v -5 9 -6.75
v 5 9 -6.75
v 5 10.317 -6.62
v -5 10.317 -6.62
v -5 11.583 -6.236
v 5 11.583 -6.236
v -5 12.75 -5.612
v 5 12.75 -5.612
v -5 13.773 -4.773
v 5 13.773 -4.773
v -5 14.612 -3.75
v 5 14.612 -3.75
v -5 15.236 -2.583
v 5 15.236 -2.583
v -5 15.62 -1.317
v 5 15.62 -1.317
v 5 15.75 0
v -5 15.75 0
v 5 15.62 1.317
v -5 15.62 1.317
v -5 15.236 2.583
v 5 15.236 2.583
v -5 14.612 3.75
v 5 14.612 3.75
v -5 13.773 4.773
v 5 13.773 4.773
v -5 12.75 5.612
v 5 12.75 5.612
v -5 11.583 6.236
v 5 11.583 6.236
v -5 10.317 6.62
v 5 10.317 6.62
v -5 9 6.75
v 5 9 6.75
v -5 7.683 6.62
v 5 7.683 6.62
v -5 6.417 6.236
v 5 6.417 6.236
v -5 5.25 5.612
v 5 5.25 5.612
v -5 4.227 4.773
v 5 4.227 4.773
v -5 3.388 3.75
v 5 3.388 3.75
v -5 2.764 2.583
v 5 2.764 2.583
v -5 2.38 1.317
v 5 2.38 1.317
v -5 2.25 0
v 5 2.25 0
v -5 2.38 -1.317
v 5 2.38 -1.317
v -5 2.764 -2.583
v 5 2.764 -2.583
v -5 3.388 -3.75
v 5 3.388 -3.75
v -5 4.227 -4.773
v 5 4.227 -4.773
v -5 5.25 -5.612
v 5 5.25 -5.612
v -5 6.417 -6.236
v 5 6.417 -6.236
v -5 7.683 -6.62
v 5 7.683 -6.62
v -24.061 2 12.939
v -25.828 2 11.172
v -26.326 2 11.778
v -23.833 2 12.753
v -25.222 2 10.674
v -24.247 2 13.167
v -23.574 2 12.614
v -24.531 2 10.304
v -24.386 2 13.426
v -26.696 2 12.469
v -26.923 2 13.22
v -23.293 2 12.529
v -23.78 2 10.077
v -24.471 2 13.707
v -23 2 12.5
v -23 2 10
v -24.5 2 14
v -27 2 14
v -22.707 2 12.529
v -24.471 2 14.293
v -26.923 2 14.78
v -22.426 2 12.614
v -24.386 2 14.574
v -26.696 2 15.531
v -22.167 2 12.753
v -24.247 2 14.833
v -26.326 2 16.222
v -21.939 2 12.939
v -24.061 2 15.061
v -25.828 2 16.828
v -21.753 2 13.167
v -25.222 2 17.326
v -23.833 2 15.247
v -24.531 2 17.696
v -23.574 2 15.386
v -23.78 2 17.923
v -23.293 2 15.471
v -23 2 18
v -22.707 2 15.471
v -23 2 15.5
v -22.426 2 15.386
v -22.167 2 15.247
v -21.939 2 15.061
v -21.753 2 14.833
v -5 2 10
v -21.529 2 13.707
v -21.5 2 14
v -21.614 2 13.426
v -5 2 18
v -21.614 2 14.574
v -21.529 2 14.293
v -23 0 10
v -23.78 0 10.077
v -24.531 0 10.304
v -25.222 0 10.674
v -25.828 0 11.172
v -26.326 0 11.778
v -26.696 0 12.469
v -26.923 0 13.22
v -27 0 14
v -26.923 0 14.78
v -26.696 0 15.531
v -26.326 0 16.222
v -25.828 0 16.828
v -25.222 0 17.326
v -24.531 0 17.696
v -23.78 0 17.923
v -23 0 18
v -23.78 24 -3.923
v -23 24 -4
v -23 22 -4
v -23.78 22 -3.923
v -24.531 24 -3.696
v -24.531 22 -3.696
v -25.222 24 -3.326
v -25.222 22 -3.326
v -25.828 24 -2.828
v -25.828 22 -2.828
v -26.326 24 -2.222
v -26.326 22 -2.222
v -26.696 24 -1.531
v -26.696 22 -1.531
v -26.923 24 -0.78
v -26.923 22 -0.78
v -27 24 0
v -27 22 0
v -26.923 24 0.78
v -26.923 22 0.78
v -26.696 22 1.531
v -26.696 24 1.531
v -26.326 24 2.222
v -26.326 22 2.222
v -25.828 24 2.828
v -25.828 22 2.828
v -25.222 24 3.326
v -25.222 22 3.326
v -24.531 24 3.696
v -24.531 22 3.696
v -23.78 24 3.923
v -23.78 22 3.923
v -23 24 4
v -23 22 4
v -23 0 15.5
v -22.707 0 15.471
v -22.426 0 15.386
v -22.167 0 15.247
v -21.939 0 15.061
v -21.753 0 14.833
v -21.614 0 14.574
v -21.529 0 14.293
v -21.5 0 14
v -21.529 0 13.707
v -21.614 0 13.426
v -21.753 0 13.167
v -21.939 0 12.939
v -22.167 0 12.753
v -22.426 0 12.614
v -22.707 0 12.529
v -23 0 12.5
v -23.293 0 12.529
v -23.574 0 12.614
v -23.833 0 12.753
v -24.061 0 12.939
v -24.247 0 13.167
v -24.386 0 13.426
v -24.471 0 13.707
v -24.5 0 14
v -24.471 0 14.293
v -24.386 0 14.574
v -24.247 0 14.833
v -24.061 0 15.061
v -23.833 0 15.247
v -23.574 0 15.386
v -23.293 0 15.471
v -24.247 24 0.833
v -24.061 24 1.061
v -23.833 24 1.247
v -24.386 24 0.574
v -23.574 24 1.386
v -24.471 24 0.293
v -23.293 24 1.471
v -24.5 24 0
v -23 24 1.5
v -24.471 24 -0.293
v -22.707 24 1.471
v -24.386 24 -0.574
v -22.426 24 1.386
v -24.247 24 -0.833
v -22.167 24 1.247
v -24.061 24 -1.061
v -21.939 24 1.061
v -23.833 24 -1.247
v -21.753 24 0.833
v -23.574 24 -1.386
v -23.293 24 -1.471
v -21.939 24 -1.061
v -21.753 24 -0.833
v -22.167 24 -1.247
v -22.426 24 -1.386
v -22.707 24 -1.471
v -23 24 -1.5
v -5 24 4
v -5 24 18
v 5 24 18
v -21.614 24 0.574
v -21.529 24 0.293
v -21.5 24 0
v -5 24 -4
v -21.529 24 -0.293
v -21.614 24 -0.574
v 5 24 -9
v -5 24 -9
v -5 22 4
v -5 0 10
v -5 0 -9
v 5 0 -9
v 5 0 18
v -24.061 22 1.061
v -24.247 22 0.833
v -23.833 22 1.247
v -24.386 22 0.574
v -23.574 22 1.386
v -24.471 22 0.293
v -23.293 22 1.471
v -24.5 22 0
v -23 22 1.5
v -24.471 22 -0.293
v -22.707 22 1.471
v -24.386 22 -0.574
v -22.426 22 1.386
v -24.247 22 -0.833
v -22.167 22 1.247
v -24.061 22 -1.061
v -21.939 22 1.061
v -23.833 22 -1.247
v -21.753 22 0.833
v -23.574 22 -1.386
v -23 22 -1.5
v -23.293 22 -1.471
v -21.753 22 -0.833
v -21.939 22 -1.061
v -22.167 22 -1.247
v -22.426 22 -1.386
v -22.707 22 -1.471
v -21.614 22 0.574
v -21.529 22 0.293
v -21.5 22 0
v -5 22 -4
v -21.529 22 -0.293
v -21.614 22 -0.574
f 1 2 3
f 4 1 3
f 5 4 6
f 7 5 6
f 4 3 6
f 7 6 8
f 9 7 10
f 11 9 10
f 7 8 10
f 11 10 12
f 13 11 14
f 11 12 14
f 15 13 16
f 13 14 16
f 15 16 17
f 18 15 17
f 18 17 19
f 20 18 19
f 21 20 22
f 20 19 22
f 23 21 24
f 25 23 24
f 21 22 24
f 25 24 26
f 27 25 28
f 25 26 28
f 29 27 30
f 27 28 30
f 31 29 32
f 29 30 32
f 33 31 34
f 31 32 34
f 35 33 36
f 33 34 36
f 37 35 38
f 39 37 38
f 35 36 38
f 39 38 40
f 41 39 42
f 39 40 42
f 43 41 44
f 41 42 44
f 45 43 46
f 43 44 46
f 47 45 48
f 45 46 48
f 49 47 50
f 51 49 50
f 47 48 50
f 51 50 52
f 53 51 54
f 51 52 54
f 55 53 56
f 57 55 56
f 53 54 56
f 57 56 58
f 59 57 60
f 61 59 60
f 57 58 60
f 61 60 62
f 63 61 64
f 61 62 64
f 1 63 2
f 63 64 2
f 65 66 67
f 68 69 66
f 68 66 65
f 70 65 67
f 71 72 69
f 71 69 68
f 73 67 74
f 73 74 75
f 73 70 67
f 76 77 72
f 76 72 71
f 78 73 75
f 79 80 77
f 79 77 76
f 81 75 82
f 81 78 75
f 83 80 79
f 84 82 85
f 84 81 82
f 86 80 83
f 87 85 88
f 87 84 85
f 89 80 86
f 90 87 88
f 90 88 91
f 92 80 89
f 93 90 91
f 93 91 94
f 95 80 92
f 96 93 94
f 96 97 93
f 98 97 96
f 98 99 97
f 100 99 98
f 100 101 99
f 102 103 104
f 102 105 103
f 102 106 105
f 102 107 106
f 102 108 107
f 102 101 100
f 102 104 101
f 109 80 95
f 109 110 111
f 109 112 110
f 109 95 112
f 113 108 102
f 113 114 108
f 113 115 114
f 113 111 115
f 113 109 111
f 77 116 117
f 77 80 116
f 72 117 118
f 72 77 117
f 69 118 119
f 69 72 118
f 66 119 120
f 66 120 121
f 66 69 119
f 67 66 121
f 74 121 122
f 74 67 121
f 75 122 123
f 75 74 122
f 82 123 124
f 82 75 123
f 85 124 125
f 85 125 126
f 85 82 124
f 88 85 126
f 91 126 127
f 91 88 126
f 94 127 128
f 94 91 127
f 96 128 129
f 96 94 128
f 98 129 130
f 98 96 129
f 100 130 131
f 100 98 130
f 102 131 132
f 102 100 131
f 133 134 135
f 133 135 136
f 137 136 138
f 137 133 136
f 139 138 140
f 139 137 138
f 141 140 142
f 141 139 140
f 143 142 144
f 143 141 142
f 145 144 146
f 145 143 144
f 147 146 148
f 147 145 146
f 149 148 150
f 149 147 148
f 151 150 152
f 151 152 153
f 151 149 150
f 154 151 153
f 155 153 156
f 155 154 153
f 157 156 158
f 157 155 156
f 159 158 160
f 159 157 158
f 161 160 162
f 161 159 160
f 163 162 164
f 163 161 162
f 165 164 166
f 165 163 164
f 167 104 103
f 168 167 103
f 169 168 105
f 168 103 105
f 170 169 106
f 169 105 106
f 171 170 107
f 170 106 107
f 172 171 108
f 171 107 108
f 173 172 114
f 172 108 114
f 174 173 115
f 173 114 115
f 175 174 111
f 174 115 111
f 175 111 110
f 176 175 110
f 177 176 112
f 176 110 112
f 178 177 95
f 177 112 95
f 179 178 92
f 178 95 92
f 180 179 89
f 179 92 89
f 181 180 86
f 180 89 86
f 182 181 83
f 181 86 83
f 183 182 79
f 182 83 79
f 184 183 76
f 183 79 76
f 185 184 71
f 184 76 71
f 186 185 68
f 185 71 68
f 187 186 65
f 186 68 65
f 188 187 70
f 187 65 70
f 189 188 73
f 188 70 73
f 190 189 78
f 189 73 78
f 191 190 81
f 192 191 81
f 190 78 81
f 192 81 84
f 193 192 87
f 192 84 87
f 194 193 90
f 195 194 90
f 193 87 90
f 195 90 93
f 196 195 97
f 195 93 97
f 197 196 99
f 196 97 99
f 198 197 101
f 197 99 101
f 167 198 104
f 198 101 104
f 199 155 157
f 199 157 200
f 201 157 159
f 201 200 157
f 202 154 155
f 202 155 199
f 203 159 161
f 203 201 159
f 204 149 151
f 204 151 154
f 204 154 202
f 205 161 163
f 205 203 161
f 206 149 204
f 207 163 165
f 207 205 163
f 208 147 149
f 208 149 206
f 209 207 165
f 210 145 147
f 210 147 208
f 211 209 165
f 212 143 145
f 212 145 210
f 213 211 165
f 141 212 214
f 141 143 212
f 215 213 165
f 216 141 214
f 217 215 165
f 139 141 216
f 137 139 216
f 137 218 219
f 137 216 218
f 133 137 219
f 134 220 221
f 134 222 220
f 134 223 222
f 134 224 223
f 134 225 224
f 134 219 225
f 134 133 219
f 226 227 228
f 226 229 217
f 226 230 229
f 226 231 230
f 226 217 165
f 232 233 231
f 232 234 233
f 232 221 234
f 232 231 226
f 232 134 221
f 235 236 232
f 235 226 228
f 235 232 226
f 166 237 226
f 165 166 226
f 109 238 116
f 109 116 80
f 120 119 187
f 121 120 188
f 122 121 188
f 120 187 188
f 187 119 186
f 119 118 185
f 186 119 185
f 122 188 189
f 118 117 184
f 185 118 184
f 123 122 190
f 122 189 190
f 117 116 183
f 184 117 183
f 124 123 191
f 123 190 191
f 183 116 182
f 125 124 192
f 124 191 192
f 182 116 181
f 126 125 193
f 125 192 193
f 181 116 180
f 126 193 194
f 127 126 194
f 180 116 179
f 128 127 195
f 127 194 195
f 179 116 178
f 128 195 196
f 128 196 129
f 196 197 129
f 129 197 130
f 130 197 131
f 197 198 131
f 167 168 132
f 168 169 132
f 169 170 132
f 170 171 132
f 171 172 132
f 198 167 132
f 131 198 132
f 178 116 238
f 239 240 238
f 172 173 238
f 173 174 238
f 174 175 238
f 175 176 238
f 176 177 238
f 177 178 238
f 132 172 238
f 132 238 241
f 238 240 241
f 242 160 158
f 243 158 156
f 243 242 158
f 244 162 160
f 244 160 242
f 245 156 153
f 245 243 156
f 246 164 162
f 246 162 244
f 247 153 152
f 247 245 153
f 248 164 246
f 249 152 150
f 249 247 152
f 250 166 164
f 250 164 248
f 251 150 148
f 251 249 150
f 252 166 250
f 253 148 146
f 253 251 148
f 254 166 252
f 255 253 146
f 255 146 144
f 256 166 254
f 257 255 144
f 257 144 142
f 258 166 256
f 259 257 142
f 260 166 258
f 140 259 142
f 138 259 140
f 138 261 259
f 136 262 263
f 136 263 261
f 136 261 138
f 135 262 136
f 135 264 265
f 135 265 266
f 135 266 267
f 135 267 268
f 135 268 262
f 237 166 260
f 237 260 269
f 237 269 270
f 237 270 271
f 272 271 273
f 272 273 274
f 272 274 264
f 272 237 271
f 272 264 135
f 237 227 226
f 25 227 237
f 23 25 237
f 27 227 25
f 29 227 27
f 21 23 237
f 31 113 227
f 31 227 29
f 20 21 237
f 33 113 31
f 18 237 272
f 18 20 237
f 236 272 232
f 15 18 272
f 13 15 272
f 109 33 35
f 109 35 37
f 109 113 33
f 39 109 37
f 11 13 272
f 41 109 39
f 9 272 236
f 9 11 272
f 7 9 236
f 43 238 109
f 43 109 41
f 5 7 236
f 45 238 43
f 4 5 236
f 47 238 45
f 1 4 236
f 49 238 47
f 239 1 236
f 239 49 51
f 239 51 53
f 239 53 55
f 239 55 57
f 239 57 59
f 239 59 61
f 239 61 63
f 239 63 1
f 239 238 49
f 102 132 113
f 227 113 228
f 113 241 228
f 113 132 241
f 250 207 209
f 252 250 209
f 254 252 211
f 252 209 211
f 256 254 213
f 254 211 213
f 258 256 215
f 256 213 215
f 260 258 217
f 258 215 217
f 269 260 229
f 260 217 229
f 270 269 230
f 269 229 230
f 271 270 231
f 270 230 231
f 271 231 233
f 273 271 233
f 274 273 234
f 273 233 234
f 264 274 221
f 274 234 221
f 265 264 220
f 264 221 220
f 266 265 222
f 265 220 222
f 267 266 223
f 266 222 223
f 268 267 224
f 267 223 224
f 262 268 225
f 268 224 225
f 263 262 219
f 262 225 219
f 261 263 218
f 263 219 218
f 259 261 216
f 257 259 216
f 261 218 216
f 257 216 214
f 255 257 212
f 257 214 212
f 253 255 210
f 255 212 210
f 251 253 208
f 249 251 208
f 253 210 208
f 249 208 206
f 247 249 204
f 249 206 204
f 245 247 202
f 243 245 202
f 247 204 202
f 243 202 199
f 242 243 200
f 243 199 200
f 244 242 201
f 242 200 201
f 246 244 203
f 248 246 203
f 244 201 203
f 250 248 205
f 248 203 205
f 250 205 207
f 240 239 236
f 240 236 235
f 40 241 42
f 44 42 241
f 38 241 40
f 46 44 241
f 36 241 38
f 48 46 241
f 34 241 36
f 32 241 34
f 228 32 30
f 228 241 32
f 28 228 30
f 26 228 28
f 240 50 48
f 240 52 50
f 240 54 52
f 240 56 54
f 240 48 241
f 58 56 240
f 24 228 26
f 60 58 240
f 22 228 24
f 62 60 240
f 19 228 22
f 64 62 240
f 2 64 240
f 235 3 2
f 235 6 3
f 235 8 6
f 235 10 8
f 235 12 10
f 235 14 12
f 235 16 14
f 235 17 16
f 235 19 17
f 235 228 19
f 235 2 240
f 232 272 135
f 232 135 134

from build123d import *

# Parameters (mm, degrees)
SKETCH2_W           = 10
SKETCH2_H           = 27
BOSS_EXTRUDE1_DEPTH = 24
SKETCH3_R           = 6.75
CUT_EXTRUDE1_DEPTH  = 10
SKETCH6_W           = 8
SKETCH6_H           = 2
BOSS_EXTRUDE2_DEPTH = 32
FILLET1_RADIUS      = 4
FILLET1_LENGTH      = 2
SKETCH8_R           = 1.5
CUT_EXTRUDE2_DEPTH  = 2
SKETCH10_W          = 8
SKETCH10_H          = 2
BOSS_EXTRUDE3_DEPTH = 22
FILLET2_RADIUS      = 4
FILLET2_LENGTH      = 2
SKETCH11_R          = 1.5
CUT_EXTRUDE4_DEPTH  = 2


with BuildPart() as part:
    # Sketch2 → Boss-Extrude1 (new body)
    with BuildSketch(Plane(origin=(0, 0, 0), x_dir=(1, 0, 0), z_dir=(0, 1, 0))):
        with Locations((0, -4.5)):
            Rectangle(SKETCH2_W, SKETCH2_H)
    extrude(amount=BOSS_EXTRUDE1_DEPTH)

    # Sketch3 → Cut-Extrude1 (cut)
    with BuildSketch(Plane(origin=(5, 0, 0), x_dir=(0, 0, -1), z_dir=(1, 0, 0))):
        with Locations((0, 9)):
            Circle(SKETCH3_R)
    extrude(amount=-CUT_EXTRUDE1_DEPTH, mode=Mode.SUBTRACT)

    # Sketch6 → Boss-Extrude2 (add)
    with BuildSketch(Plane(origin=(5, 0, 0), x_dir=(0, 0, -1), z_dir=(1, 0, 0))):
        with Locations((0, 23)):
            Rectangle(SKETCH6_W, SKETCH6_H)
    extrude(amount=-BOSS_EXTRUDE2_DEPTH)

    # Fillet1: full round fillet: the end face becomes a half cylinder, R = half its width
    fillet1_face = Plane((-27, 23, 0), x_dir=(0, 1, 0), z_dir=(-1, 0, 0))  # on the end face: x along it, z out of the body
    fillet1_slab = fillet1_face.offset(-FILLET1_RADIUS / 2) * Box(FILLET1_LENGTH, 2 * FILLET1_RADIUS, FILLET1_RADIUS, mode=Mode.PRIVATE)  # the body's end, R deep
    fillet1_round = Plane((-23, 23, 0), x_dir=(-1, 0, 0), z_dir=(0, 1, 0)) * Cylinder(FILLET1_RADIUS, FILLET1_LENGTH, mode=Mode.PRIVATE)  # its axis R under the face
    add(fillet1_slab - fillet1_round, mode=Mode.SUBTRACT)

    # Sketch8 → Cut-Extrude2 (cut)
    with BuildSketch(Plane(origin=(0, 24, 0), x_dir=(1, 0, 0), z_dir=(0, 1, 0))):
        with Locations(Location((-23, 0, 0), (0, 0, 270))):
            Circle(SKETCH8_R)
    extrude(amount=-CUT_EXTRUDE2_DEPTH, mode=Mode.SUBTRACT)

    # Sketch10 → Boss-Extrude3 (add)
    with BuildSketch(Plane.ZY.offset(5)):
        with Locations((14, 1)):
            Rectangle(SKETCH10_W, SKETCH10_H)
    extrude(amount=BOSS_EXTRUDE3_DEPTH)

    # Fillet2: full round fillet: the end face becomes a half cylinder, R = half its width
    fillet2_face = Plane((-27, 1, 14), x_dir=(0, 1, 0), z_dir=(-1, 0, 0))  # on the end face: x along it, z out of the body
    fillet2_slab = fillet2_face.offset(-FILLET2_RADIUS / 2) * Box(FILLET2_LENGTH, 2 * FILLET2_RADIUS, FILLET2_RADIUS, mode=Mode.PRIVATE)  # the body's end, R deep
    fillet2_round = Plane((-23, 1, 14), x_dir=(-1, 0, 0), z_dir=(0, 1, 0)) * Cylinder(FILLET2_RADIUS, FILLET2_LENGTH, mode=Mode.PRIVATE)  # its axis R under the face
    add(fillet2_slab - fillet2_round, mode=Mode.SUBTRACT)

    # Sketch11 → Cut-Extrude4 (cut)
    with BuildSketch(Plane(origin=(0, 2, 0), x_dir=(1, 0, 0), z_dir=(0, 1, 0))):
        with Locations(Location((-23, -14, 0), (0, 0, 270))):
            Circle(SKETCH11_R)
    extrude(amount=-CUT_EXTRUDE4_DEPTH, mode=Mode.SUBTRACT)


solid = part.part
